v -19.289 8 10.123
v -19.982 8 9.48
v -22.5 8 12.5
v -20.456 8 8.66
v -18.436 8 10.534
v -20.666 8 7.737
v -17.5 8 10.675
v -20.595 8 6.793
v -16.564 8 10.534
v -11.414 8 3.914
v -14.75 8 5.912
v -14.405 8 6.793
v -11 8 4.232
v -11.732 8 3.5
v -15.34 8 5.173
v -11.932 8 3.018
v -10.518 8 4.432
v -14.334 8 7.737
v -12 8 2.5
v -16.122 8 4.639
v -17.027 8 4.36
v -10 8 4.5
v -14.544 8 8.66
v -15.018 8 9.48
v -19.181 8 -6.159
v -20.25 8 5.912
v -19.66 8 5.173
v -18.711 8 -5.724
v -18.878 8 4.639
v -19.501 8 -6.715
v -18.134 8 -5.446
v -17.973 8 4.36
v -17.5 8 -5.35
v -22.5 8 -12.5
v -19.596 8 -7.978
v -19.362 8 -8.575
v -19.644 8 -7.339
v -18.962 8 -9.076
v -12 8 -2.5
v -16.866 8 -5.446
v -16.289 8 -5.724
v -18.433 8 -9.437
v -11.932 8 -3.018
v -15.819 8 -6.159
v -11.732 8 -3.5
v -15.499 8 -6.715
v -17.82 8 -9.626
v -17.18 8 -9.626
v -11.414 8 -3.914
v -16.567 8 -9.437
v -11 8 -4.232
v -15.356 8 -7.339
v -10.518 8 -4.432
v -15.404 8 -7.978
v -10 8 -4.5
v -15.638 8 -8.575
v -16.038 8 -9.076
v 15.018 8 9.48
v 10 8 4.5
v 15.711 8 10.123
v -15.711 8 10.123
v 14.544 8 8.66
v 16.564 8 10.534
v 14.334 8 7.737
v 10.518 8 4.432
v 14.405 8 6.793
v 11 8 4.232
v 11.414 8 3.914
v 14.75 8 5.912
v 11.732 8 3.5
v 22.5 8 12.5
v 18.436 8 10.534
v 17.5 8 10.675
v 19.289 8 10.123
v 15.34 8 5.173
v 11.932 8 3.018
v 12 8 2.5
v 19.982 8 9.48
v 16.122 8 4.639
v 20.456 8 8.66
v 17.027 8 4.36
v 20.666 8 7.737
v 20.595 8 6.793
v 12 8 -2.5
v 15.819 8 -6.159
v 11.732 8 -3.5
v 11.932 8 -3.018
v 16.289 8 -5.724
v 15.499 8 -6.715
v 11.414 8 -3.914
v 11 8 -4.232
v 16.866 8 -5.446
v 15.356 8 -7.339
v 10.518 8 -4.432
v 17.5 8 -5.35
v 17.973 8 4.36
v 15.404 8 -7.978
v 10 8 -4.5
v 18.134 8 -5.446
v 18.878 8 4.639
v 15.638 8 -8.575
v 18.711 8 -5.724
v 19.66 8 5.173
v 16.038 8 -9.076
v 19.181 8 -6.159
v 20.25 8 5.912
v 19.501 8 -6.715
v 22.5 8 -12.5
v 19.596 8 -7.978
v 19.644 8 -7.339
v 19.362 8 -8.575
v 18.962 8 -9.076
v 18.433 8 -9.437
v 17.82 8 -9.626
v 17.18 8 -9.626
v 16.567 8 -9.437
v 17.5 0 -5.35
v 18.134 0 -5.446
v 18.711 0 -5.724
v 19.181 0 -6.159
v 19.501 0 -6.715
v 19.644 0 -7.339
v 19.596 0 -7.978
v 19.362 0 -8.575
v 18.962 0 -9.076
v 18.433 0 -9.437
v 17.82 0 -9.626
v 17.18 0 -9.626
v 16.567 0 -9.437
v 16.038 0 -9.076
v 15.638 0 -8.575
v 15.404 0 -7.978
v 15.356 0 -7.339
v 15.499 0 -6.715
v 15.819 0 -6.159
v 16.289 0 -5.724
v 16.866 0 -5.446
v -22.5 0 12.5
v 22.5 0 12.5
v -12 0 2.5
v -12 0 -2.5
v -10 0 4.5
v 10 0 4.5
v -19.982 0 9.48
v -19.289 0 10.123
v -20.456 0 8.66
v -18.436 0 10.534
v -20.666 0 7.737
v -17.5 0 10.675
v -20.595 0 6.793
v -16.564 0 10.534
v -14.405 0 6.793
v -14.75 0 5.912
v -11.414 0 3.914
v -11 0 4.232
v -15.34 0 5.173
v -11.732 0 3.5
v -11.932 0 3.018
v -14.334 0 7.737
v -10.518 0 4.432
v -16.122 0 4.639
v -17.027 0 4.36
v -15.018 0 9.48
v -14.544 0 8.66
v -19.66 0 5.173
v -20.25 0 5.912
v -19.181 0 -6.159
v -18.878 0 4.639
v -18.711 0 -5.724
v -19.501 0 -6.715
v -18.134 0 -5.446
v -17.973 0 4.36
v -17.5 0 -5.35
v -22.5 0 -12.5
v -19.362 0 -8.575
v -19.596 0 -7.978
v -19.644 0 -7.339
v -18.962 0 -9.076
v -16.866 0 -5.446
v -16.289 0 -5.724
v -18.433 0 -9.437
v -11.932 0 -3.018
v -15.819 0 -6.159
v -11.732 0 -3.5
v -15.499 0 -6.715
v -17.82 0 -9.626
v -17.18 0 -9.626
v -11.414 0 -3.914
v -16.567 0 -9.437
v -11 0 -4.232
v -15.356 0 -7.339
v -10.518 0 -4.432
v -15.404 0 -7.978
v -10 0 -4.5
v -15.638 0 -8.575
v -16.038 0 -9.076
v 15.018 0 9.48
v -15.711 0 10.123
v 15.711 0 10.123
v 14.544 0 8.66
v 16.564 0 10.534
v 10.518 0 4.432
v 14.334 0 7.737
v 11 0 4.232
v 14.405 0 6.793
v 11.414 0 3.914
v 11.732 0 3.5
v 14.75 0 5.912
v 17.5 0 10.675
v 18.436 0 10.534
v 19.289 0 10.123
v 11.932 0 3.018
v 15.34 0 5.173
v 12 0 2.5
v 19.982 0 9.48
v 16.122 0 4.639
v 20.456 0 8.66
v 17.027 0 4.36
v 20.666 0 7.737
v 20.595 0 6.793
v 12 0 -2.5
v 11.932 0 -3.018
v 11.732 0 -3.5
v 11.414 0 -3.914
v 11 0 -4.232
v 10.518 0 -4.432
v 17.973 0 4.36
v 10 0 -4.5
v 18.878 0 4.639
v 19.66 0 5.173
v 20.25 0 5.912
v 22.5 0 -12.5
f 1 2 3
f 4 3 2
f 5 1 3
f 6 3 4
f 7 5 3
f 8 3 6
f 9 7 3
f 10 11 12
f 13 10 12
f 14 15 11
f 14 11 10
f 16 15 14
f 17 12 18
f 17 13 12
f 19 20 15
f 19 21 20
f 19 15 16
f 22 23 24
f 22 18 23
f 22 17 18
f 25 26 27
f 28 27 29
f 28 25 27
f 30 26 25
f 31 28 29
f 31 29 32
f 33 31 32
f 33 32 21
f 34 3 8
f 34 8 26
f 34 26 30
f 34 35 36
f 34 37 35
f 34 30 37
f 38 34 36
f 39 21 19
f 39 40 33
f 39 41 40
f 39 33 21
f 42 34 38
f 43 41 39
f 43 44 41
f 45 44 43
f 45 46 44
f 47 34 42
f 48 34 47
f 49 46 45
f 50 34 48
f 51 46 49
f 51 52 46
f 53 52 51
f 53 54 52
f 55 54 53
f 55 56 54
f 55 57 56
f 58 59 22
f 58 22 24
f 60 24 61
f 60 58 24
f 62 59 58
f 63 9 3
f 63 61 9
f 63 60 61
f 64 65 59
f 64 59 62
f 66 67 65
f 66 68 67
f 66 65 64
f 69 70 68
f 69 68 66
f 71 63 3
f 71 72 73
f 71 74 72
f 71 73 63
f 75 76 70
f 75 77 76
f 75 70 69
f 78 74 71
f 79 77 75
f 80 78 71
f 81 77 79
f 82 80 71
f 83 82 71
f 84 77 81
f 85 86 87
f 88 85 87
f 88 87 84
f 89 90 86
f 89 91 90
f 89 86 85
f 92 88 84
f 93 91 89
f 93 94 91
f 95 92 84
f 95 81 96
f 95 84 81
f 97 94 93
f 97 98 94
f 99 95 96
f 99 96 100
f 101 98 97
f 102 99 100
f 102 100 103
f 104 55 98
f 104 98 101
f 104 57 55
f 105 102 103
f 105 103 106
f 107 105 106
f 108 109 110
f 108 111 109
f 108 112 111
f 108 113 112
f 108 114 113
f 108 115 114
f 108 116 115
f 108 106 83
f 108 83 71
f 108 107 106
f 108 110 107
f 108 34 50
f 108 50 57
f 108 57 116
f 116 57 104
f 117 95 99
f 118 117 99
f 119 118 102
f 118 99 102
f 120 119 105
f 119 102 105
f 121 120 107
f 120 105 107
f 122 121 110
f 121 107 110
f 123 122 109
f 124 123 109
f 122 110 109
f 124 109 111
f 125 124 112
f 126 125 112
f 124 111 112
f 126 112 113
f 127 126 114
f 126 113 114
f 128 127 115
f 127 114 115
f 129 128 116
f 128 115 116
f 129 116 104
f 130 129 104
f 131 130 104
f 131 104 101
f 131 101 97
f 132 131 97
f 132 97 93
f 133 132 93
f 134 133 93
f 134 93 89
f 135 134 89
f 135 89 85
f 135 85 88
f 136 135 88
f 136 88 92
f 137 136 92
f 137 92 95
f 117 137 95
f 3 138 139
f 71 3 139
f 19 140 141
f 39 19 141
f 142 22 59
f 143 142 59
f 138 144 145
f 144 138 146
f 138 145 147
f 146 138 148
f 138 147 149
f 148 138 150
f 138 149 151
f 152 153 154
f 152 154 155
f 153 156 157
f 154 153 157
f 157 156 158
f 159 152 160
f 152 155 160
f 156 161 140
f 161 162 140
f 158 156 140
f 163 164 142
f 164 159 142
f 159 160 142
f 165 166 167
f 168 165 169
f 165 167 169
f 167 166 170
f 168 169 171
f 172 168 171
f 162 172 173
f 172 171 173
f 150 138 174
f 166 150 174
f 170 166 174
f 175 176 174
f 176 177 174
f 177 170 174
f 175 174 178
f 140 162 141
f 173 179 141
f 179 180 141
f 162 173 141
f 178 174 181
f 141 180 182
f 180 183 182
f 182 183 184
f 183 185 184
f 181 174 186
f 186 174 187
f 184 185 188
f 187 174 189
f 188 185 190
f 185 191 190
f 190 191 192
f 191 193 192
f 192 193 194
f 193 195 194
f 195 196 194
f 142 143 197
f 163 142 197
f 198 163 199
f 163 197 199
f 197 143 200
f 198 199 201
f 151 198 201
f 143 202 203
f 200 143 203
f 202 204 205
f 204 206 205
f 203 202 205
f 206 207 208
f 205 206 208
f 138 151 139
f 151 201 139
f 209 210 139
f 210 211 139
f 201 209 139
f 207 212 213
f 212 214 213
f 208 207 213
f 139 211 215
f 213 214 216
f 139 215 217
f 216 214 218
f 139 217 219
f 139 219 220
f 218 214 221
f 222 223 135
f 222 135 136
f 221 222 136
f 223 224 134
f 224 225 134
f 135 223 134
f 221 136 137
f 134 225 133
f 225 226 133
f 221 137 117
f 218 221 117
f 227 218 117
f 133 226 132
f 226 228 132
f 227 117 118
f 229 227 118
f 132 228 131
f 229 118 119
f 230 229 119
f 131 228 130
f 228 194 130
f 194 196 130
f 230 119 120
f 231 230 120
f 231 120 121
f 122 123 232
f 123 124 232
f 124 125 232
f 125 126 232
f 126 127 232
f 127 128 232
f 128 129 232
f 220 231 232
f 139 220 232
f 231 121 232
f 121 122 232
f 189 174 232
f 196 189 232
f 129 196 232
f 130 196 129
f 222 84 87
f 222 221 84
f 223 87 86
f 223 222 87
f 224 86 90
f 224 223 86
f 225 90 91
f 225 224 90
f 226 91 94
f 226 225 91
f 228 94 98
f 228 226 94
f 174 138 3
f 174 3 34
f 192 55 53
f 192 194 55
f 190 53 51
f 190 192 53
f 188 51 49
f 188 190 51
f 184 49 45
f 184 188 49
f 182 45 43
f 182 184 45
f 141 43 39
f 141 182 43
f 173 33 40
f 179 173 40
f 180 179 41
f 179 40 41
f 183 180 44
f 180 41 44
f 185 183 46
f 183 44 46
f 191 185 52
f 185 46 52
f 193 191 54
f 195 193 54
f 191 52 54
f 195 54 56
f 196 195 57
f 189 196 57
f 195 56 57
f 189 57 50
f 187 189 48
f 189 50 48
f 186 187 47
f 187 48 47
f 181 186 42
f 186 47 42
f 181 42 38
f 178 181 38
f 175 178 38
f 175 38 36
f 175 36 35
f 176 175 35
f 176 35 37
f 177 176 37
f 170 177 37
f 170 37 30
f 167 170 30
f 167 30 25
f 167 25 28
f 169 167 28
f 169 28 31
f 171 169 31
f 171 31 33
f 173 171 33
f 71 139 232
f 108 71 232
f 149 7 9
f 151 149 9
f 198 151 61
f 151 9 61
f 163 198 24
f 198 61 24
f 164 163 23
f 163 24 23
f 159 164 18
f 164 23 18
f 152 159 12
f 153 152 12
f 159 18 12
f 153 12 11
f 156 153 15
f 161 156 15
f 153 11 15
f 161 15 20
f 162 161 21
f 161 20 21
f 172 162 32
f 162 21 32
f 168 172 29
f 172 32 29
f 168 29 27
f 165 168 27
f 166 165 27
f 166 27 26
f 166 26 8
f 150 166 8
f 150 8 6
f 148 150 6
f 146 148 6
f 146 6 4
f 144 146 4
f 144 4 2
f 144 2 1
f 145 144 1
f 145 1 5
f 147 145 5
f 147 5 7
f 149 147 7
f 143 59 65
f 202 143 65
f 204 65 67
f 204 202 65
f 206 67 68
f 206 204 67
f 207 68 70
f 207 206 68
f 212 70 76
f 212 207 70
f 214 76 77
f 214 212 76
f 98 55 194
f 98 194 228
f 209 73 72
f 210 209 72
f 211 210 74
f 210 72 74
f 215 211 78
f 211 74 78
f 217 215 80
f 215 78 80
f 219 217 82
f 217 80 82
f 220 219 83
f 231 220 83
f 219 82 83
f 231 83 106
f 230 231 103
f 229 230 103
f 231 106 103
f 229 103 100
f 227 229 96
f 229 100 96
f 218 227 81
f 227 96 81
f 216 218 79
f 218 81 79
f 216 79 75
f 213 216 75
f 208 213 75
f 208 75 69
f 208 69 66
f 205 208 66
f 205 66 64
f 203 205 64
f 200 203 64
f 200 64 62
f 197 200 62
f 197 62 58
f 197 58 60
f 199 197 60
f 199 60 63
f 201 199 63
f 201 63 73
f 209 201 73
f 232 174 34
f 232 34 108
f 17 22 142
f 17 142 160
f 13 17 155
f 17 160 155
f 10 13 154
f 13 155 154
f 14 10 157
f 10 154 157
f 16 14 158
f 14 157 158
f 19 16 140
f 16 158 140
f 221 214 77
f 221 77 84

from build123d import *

# Parameters (mm, degrees)
SKETCH_1_W          = 45
SKETCH_1_H          = 25
EXTRUDE_1_DEPTH     = 8
SKETCH_2_R          = 2.15
SKETCH_2_R_2        = 3.175
CUT_EXTRUDE_1_DEPTH = 27.953663944
SKETCH_3_W          = 24
SKETCH_3_H          = 9
CUT_EXTRUDE_2_DEPTH = 27.953663944
FILLET_1_R          = 2


with BuildPart() as part:
    # 草图1 → 凸台-拉伸1 (new body)
    with BuildSketch(Plane(origin=(0, 0, 0), x_dir=(1, 0, 0), z_dir=(0, 1, 0))):
        Rectangle(SKETCH_1_W, SKETCH_1_H)
    extrude(amount=EXTRUDE_1_DEPTH)

    # 草图2 → 切除-拉伸1 (cut, through all)
    with BuildSketch(Plane(origin=(0, 8, 0), x_dir=(1, 0, 0), z_dir=(0, 1, 0))):
        with Locations(Location((-17.5, 7.5, 0), (0, 0, 270))):
            Circle(SKETCH_2_R)
        with Locations(Location((17.5, 7.5, 0), (0, 0, 270))):
            Circle(SKETCH_2_R)
        with Locations(Location((17.5, -7.5, 0), (0, 0, 270))):
            Circle(SKETCH_2_R_2)
        with Locations(Location((-17.5, -7.5, 0), (0, 0, 270))):
            Circle(SKETCH_2_R_2)
    extrude(amount=-CUT_EXTRUDE_1_DEPTH, mode=Mode.SUBTRACT)

    # 草图3 → 切除-拉伸2 (cut, through all)
    with BuildSketch(Plane(origin=(0, 8, 0), x_dir=(1, 0, 0), z_dir=(0, 1, 0))):
        Rectangle(SKETCH_3_W, SKETCH_3_H)
    extrude(amount=-CUT_EXTRUDE_2_DEPTH, mode=Mode.SUBTRACT)

    # 圆角1
    fillet_1_edges = [part.edges().sort_by_distance(p)[0] for p in [
        (-12, 4, 4.5),
        (-12, 4, -4.5),
        (12, 4, -4.5),
        (12, 4, 4.5),
    ]]
    fillet(fillet_1_edges, radius=FILLET_1_R)


solid = part.part
